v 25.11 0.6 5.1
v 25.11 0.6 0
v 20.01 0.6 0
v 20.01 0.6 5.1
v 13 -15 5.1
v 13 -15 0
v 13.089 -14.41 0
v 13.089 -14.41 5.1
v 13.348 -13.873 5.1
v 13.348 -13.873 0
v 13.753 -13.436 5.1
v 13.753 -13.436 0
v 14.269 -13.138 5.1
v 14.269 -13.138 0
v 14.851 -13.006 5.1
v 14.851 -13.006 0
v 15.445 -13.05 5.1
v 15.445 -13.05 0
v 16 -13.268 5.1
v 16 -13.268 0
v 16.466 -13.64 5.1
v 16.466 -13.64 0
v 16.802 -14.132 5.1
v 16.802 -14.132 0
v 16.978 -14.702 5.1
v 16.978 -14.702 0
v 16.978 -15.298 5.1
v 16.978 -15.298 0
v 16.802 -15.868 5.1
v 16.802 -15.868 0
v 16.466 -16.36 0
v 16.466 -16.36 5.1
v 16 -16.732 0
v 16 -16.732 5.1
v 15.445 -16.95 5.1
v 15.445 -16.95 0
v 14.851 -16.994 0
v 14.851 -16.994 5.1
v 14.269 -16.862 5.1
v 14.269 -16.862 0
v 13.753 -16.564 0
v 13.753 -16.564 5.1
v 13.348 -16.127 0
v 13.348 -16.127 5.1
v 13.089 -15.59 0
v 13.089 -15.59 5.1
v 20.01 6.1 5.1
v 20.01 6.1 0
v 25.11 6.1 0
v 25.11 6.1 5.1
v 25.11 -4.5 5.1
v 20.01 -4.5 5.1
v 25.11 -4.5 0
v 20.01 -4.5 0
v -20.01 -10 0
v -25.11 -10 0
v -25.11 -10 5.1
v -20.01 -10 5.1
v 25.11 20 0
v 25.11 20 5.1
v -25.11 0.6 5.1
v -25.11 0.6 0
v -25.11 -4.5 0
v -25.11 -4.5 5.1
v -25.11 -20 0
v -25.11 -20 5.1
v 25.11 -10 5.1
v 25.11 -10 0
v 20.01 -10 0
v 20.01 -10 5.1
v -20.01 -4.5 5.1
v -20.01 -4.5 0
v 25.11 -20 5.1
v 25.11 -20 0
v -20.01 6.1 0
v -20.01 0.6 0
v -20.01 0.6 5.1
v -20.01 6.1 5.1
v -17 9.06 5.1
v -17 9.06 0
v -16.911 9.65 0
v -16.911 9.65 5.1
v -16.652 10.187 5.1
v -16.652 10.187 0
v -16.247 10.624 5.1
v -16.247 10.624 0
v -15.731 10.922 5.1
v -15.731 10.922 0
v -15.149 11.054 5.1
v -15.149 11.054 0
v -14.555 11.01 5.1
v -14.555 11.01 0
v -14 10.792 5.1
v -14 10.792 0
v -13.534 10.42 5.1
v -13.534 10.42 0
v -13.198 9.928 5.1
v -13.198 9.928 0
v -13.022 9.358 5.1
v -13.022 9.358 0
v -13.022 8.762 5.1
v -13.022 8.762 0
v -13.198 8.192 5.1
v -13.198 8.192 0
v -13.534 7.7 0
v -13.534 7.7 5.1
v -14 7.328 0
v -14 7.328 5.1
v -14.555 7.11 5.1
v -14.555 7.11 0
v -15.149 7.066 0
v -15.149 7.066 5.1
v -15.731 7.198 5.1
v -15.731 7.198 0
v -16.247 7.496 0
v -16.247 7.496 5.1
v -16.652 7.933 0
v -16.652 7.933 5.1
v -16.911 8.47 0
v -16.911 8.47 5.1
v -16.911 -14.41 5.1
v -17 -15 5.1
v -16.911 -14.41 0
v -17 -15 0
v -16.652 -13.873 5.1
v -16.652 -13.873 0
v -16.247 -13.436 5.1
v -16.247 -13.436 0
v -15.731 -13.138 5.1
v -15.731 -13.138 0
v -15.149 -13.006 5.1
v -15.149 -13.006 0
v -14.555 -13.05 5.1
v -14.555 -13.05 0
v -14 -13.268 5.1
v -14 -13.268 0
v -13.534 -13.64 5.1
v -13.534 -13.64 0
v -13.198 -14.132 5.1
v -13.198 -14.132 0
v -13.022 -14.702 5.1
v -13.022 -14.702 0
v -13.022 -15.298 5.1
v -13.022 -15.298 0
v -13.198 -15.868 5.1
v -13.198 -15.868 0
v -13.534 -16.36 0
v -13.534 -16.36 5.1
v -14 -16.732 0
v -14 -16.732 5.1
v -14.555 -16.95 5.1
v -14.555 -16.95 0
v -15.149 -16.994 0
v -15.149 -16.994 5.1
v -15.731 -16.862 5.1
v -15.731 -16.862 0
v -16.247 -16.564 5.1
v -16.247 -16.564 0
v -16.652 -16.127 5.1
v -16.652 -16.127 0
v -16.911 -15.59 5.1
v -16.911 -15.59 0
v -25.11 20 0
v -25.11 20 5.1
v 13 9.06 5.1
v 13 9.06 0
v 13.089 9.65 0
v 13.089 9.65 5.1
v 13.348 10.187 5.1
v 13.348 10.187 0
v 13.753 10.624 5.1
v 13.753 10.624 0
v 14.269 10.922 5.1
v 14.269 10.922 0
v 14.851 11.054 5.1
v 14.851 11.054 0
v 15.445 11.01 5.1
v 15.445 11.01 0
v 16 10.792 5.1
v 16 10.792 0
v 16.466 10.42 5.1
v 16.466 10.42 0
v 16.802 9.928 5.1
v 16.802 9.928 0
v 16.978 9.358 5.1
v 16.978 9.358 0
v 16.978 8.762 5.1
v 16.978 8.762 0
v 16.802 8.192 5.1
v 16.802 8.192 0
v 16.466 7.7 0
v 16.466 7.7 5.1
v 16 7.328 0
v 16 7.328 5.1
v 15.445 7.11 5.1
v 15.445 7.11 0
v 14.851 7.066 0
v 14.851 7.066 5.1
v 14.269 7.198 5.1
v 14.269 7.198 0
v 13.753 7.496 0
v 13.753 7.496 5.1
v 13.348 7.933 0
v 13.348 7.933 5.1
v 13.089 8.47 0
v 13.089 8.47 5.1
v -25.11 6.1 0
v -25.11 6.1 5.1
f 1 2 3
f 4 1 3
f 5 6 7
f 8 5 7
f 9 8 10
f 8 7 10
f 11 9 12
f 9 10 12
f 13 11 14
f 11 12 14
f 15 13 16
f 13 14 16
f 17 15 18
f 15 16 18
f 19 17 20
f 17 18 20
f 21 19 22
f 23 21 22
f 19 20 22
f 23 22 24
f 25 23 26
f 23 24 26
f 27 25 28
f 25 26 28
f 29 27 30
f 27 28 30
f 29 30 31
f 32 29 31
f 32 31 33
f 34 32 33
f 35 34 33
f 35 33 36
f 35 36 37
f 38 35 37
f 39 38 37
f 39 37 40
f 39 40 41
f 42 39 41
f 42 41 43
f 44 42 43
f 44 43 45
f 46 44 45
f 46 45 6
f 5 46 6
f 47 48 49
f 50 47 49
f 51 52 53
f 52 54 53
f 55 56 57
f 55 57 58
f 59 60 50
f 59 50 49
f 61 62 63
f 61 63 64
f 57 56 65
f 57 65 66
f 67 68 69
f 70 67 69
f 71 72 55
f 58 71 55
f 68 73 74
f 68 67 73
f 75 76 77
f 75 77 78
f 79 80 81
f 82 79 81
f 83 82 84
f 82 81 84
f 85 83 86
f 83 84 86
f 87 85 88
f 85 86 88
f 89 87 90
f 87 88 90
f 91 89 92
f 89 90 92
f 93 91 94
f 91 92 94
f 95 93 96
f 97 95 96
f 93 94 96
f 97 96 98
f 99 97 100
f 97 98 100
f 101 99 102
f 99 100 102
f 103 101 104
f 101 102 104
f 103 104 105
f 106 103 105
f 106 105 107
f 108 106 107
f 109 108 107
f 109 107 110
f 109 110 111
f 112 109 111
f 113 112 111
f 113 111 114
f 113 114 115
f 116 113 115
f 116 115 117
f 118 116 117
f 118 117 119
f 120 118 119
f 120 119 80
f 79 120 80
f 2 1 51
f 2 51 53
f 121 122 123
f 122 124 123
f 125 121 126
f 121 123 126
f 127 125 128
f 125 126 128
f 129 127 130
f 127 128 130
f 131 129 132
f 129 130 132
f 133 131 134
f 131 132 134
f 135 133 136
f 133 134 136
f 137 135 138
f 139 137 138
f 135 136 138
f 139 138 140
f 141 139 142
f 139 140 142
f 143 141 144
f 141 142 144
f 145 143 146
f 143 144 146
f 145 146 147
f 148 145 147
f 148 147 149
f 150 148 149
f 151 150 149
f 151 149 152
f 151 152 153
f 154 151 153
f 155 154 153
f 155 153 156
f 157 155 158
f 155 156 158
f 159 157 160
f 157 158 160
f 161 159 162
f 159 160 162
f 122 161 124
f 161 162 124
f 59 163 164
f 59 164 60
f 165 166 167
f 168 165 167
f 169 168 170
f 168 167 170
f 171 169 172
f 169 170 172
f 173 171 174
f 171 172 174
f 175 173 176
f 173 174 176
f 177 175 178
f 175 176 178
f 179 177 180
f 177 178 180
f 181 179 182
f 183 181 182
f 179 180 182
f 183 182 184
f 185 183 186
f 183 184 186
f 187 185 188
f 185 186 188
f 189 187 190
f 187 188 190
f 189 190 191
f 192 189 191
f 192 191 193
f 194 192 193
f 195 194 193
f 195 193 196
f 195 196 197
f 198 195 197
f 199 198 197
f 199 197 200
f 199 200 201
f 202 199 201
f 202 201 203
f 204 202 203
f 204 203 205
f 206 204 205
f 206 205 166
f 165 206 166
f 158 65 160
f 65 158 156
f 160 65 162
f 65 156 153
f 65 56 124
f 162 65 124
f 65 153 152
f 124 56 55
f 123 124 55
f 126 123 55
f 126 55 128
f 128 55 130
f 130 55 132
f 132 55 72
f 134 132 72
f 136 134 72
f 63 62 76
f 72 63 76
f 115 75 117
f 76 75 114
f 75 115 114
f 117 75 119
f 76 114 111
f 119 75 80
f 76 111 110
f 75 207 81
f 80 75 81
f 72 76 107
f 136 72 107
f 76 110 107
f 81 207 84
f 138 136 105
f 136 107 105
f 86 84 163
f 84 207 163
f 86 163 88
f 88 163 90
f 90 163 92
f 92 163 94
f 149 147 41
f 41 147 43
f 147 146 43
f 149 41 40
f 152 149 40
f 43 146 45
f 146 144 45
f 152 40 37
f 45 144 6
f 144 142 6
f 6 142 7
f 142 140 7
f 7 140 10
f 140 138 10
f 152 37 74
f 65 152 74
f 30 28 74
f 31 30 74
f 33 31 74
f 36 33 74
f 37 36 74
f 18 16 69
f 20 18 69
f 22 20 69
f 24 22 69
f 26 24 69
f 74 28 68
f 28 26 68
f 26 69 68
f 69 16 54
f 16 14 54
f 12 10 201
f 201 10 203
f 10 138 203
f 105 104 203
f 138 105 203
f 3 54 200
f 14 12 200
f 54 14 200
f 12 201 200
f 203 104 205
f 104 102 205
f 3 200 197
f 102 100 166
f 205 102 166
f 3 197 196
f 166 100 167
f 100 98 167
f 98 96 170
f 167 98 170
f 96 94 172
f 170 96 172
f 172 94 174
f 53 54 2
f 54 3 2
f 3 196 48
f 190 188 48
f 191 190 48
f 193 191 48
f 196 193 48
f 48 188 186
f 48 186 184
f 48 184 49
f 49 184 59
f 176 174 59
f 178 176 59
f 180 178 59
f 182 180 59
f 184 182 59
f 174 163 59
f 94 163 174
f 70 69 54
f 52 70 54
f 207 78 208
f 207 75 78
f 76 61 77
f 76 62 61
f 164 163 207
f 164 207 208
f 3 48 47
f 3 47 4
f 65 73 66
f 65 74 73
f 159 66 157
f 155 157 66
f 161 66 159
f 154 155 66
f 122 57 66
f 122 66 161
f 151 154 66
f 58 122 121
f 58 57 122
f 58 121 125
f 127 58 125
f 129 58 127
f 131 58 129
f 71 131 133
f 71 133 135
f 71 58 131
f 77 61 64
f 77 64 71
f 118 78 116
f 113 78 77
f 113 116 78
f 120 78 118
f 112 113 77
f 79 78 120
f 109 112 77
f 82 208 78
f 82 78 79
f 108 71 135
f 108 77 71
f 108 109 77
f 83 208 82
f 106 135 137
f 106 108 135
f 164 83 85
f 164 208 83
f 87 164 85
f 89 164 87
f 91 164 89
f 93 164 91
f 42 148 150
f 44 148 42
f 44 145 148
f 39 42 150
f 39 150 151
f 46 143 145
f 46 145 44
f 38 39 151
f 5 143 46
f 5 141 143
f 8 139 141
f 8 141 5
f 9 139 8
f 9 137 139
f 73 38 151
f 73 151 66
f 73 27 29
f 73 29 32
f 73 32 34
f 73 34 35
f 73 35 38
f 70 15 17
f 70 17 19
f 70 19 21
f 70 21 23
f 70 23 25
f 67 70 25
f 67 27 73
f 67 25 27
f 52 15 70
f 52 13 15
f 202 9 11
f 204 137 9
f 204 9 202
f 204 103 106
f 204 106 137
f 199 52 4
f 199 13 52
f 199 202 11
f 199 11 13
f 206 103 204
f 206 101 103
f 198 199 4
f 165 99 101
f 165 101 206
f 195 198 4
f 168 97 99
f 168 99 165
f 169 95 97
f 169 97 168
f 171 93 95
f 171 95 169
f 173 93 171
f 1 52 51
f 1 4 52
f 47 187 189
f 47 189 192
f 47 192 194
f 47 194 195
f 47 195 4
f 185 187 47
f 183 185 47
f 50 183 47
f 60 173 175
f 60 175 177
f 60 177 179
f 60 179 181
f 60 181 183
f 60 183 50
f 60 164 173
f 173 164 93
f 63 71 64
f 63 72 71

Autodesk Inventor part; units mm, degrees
ref_plane "YZ Plane" through (0, 0, 0) normal (1, 0, 0) x (0, 1, 0)
ref_plane "XZ Plane" through (0, 0, 0) normal (0, 1, 0) x (-1, 0, 0)
ref_plane "XY Plane" through (0, 0, 0) normal (0, 0, 1) x (1, 0, 0)
sketch "Sketch1" plane through (0, 0, 0) normal (0, 0, 1) x (1, 0, 0)
  line L0 (20.01, -20) -> (-20.01, -20)
  line L1 (-20.01, -20) -> (-20.01, 20)
  line L2 (-20.01, 20) -> (20.01, 20)
  line L3 (20.01, 20) -> (20.01, -20)
  line L4 (20.01, -20) -> (-20.01, 20) construction
  line L5 (-20.01, -20) -> (20.01, 20) construction
  line L6 (-20.01, 20) -> (-25.11, 20)
  line L7 (-25.11, 20) -> (-25.11, -20)
  line L8 (-25.11, -20) -> (-20.01, -20)
  line L9 (-20.01, -20) -> (-20.01, 20)
  line L10 (20.01, 20) -> (25.11, 20)
  line L11 (25.11, 20) -> (25.11, -20)
  line L12 (25.11, -20) -> (20.01, -20)
  line L13 (20.01, -20) -> (20.01, 20)
  point P0 (0, 0)
  point P1 (20.01, -20)
  dimension "d0" = 40.02
  dimension "d1" = 40
  dimension "d2" = 5.1
  dimension "d3" = 5.1
extrude "Extrusion1" add sketch "Sketch1" along normal blind 5.1 contours L0 L1 L2 L3
sketch "Sketch3" plane through (0, 0, 0) normal (0, 0, -1) x (-1, 0, 0)
  circle A0 centre (15, -15) radius 2
  circle A1 centre (-15, -15) radius 2
  circle A2 centre (15, 9.06) radius 2
  circle A3 centre (-15, 9.06) radius 2
  point P0 (0, 0)
  dimension "d8" = 4
  dimension "d9" = 4
  dimension "d10" = 4
  dimension "d11" = 4
  dimension "d12" = 15
  dimension "d14" = 15
  dimension "d16" = 15
  dimension "d17" = 15
  dimension "d18" = 15
  dimension "d19" = 15
  dimension "d30" = 24.06
  dimension "d31" = 24.06
extrude "Extrusion3" cut sketch "Sketch3" against normal blind 10
thread "Thread1" size "M4x0.7" class "6H" standard "ANSI Metric M Profile" length 150
thread "Thread2" size "M4x0.7" class "6H" standard "ANSI Metric M Profile" length 150
thread "Thread3" size "M4x0.7" class "6H" standard "ANSI Metric M Profile" length 150
thread "Thread4" size "M4x0.7" class "6H" standard "ANSI Metric M Profile" length 150
sketch "Sketch4" plane through (0, 0, 0) normal (0, 0, -1) x (-1, 0, 0)
  line L0 (20.01, 20) -> (20.01, -20) projected
  line L1 (20.01, -10) -> (14.91, -10)
  line L2 (14.91, -10) -> (14.91, -4.5)
  line L3 (14.91, -4.5) -> (20.01, -4.5)
  line L4 (20.01, -4.5) -> (20.01, -10)
  line L5 (20.01, -20) -> (-20.01, -20) projected
  line L6 (20.01, 0.6) -> (14.91, 0.6)
  line L7 (14.91, 0.6) -> (14.91, 6.1)
  line L8 (14.91, 6.1) -> (20.01, 6.1)
  line L9 (20.01, 6.1) -> (20.01, 0.6)
  line L10 (-20.01, 20) -> (20.01, 20) projected
  line L11 (0, 0) -> (0, -7.4) construction
  line L12 (-20.01, -10) -> (-14.91, -10)
  line L13 (-14.91, -10) -> (-14.91, -4.5)
  line L14 (-14.91, -4.5) -> (-20.01, -4.5)
  line L15 (-20.01, -4.5) -> (-20.01, -10)
  line L16 (-20.01, 0.6) -> (-14.91, 0.6)
  line L17 (-14.91, 0.6) -> (-14.91, 6.1)
  line L18 (-14.91, 6.1) -> (-20.01, 6.1)
  line L19 (-20.01, 6.1) -> (-20.01, 0.6)
  dimension "d32" = 5.1
  dimension "d33" = 5.5
  dimension "d34" = 10
  dimension "d35" = 5.1
  dimension "d36" = 5.5
  dimension "d37" = 13.9
extrude "Extrusion4" cut sketch "Sketch4" against normal blind 10
sketch "Sketch5" plane through (-20.01, -20, 0) normal (-1, 0, 0) x (0, 0, 1)
  line L0 (5.1, 10) -> (0, 10) projected
  line L1 (0, 10) -> (0, 0) projected
  line L2 (0, 0) -> (5.1, 0) projected
  line L3 (5.1, 10) -> (5.1, 0) projected
  line L4 (5.1, 20.6) -> (0, 20.6) projected
  line L5 (0, 20.6) -> (0, 15.5) projected
  line L6 (0, 15.5) -> (5.1, 15.5) projected
  line L7 (5.1, 20.6) -> (5.1, 15.5) projected
  line L8 (0, 26.1) -> (5.1, 26.1) projected
  line L9 (5.1, 40) -> (5.1, 26.1) projected
  line L10 (0, 40) -> (5.1, 40) projected
  line L11 (0, 40) -> (0, 26.1) projected
  point P0 (0, 20)
extrude "Extrusion5" add sketch "Sketch5" along normal blind 5.1
sketch "Sketch6" plane through (20.01, -20, 5.1) normal (1, 0, 0) x (0, 0, -1)
  line L0 (5.1, 10) -> (0, 10) projected
  line L1 (0, 0) -> (0, 10) projected
  line L2 (5.1, 0) -> (0, 0) projected
  line L3 (5.1, 0) -> (5.1, 10) projected
  line L4 (0, 15.5) -> (5.1, 15.5) projected
  line L5 (5.1, 15.5) -> (5.1, 20.6) projected
  line L6 (5.1, 20.6) -> (0, 20.6) projected
  line L7 (0, 15.5) -> (0, 20.6) projected
  line L8 (5.1, 31.06) -> (0, 31.06) projected
  line L9 (0, 26.1) -> (5.1, 26.1) projected
  line L10 (5.1, 26.1) -> (5.1, 40) projected
  line L11 (5.1, 40) -> (0, 40) projected
  line L12 (0, 26.1) -> (0, 40) projected
  point P0 (5.1, 20)
extrude "Extrusion6" add sketch "Sketch6" along normal blind 5.1
sketch "Sketch7" plane through (0, 0, 0) normal (0, 0, -1) x (-1, 0, 0)
  line L0 (14.91, -10) -> (14.91, -4.5) projected
  line L1 (14.91, -10) -> (25.11, -10) projected
  line L2 (14.91, -4.5) -> (20.01, -4.5)
  line L3 (20.01, -4.5) -> (20.01, -10)
  line L4 (20.01, -10) -> (14.91, -10)
  line L5 (14.91, -10) -> (14.91, -4.5)
  line L6 (14.91, 0.6) -> (14.91, 6.1) projected
  line L7 (14.91, 6.1) -> (25.11, 6.1) projected
  line L8 (14.91, 0.6) -> (20.01, 0.6)
  line L9 (20.01, 0.6) -> (20.01, 6.1)
  line L10 (20.01, 6.1) -> (14.91, 6.1)
  line L11 (14.91, 6.1) -> (14.91, 0.6)
  line L12 (-14.91, -10) -> (-25.11, -10) projected
  line L13 (-14.91, -4.5) -> (-25.11, -4.5) projected
  line L14 (-14.91, -10) -> (-20.01, -10)
  line L15 (-20.01, -10) -> (-20.01, -4.5)
  line L16 (-20.01, -4.5) -> (-14.91, -4.5)
  line L17 (-14.91, -4.5) -> (-14.91, -10)
  line L18 (-14.91, 6.1) -> (-14.91, 0.6) projected
  line L19 (-14.91, 0.6) -> (-25.11, 0.6) projected
  line L20 (-14.91, 6.1) -> (-20.01, 6.1)
  line L21 (-20.01, 6.1) -> (-20.01, 0.6)
  line L22 (-20.01, 0.6) -> (-14.91, 0.6)
  line L23 (-14.91, 0.6) -> (-14.91, 6.1)
  point P0 (0, 0)
  dimension "d44" = 5.1
  dimension "d45" = 5.1
extrude "Extrusion7" add sketch "Sketch7" against normal blind 5.1
properties part number "caster wheel mounter" material "Polycarbonate, Clear"
